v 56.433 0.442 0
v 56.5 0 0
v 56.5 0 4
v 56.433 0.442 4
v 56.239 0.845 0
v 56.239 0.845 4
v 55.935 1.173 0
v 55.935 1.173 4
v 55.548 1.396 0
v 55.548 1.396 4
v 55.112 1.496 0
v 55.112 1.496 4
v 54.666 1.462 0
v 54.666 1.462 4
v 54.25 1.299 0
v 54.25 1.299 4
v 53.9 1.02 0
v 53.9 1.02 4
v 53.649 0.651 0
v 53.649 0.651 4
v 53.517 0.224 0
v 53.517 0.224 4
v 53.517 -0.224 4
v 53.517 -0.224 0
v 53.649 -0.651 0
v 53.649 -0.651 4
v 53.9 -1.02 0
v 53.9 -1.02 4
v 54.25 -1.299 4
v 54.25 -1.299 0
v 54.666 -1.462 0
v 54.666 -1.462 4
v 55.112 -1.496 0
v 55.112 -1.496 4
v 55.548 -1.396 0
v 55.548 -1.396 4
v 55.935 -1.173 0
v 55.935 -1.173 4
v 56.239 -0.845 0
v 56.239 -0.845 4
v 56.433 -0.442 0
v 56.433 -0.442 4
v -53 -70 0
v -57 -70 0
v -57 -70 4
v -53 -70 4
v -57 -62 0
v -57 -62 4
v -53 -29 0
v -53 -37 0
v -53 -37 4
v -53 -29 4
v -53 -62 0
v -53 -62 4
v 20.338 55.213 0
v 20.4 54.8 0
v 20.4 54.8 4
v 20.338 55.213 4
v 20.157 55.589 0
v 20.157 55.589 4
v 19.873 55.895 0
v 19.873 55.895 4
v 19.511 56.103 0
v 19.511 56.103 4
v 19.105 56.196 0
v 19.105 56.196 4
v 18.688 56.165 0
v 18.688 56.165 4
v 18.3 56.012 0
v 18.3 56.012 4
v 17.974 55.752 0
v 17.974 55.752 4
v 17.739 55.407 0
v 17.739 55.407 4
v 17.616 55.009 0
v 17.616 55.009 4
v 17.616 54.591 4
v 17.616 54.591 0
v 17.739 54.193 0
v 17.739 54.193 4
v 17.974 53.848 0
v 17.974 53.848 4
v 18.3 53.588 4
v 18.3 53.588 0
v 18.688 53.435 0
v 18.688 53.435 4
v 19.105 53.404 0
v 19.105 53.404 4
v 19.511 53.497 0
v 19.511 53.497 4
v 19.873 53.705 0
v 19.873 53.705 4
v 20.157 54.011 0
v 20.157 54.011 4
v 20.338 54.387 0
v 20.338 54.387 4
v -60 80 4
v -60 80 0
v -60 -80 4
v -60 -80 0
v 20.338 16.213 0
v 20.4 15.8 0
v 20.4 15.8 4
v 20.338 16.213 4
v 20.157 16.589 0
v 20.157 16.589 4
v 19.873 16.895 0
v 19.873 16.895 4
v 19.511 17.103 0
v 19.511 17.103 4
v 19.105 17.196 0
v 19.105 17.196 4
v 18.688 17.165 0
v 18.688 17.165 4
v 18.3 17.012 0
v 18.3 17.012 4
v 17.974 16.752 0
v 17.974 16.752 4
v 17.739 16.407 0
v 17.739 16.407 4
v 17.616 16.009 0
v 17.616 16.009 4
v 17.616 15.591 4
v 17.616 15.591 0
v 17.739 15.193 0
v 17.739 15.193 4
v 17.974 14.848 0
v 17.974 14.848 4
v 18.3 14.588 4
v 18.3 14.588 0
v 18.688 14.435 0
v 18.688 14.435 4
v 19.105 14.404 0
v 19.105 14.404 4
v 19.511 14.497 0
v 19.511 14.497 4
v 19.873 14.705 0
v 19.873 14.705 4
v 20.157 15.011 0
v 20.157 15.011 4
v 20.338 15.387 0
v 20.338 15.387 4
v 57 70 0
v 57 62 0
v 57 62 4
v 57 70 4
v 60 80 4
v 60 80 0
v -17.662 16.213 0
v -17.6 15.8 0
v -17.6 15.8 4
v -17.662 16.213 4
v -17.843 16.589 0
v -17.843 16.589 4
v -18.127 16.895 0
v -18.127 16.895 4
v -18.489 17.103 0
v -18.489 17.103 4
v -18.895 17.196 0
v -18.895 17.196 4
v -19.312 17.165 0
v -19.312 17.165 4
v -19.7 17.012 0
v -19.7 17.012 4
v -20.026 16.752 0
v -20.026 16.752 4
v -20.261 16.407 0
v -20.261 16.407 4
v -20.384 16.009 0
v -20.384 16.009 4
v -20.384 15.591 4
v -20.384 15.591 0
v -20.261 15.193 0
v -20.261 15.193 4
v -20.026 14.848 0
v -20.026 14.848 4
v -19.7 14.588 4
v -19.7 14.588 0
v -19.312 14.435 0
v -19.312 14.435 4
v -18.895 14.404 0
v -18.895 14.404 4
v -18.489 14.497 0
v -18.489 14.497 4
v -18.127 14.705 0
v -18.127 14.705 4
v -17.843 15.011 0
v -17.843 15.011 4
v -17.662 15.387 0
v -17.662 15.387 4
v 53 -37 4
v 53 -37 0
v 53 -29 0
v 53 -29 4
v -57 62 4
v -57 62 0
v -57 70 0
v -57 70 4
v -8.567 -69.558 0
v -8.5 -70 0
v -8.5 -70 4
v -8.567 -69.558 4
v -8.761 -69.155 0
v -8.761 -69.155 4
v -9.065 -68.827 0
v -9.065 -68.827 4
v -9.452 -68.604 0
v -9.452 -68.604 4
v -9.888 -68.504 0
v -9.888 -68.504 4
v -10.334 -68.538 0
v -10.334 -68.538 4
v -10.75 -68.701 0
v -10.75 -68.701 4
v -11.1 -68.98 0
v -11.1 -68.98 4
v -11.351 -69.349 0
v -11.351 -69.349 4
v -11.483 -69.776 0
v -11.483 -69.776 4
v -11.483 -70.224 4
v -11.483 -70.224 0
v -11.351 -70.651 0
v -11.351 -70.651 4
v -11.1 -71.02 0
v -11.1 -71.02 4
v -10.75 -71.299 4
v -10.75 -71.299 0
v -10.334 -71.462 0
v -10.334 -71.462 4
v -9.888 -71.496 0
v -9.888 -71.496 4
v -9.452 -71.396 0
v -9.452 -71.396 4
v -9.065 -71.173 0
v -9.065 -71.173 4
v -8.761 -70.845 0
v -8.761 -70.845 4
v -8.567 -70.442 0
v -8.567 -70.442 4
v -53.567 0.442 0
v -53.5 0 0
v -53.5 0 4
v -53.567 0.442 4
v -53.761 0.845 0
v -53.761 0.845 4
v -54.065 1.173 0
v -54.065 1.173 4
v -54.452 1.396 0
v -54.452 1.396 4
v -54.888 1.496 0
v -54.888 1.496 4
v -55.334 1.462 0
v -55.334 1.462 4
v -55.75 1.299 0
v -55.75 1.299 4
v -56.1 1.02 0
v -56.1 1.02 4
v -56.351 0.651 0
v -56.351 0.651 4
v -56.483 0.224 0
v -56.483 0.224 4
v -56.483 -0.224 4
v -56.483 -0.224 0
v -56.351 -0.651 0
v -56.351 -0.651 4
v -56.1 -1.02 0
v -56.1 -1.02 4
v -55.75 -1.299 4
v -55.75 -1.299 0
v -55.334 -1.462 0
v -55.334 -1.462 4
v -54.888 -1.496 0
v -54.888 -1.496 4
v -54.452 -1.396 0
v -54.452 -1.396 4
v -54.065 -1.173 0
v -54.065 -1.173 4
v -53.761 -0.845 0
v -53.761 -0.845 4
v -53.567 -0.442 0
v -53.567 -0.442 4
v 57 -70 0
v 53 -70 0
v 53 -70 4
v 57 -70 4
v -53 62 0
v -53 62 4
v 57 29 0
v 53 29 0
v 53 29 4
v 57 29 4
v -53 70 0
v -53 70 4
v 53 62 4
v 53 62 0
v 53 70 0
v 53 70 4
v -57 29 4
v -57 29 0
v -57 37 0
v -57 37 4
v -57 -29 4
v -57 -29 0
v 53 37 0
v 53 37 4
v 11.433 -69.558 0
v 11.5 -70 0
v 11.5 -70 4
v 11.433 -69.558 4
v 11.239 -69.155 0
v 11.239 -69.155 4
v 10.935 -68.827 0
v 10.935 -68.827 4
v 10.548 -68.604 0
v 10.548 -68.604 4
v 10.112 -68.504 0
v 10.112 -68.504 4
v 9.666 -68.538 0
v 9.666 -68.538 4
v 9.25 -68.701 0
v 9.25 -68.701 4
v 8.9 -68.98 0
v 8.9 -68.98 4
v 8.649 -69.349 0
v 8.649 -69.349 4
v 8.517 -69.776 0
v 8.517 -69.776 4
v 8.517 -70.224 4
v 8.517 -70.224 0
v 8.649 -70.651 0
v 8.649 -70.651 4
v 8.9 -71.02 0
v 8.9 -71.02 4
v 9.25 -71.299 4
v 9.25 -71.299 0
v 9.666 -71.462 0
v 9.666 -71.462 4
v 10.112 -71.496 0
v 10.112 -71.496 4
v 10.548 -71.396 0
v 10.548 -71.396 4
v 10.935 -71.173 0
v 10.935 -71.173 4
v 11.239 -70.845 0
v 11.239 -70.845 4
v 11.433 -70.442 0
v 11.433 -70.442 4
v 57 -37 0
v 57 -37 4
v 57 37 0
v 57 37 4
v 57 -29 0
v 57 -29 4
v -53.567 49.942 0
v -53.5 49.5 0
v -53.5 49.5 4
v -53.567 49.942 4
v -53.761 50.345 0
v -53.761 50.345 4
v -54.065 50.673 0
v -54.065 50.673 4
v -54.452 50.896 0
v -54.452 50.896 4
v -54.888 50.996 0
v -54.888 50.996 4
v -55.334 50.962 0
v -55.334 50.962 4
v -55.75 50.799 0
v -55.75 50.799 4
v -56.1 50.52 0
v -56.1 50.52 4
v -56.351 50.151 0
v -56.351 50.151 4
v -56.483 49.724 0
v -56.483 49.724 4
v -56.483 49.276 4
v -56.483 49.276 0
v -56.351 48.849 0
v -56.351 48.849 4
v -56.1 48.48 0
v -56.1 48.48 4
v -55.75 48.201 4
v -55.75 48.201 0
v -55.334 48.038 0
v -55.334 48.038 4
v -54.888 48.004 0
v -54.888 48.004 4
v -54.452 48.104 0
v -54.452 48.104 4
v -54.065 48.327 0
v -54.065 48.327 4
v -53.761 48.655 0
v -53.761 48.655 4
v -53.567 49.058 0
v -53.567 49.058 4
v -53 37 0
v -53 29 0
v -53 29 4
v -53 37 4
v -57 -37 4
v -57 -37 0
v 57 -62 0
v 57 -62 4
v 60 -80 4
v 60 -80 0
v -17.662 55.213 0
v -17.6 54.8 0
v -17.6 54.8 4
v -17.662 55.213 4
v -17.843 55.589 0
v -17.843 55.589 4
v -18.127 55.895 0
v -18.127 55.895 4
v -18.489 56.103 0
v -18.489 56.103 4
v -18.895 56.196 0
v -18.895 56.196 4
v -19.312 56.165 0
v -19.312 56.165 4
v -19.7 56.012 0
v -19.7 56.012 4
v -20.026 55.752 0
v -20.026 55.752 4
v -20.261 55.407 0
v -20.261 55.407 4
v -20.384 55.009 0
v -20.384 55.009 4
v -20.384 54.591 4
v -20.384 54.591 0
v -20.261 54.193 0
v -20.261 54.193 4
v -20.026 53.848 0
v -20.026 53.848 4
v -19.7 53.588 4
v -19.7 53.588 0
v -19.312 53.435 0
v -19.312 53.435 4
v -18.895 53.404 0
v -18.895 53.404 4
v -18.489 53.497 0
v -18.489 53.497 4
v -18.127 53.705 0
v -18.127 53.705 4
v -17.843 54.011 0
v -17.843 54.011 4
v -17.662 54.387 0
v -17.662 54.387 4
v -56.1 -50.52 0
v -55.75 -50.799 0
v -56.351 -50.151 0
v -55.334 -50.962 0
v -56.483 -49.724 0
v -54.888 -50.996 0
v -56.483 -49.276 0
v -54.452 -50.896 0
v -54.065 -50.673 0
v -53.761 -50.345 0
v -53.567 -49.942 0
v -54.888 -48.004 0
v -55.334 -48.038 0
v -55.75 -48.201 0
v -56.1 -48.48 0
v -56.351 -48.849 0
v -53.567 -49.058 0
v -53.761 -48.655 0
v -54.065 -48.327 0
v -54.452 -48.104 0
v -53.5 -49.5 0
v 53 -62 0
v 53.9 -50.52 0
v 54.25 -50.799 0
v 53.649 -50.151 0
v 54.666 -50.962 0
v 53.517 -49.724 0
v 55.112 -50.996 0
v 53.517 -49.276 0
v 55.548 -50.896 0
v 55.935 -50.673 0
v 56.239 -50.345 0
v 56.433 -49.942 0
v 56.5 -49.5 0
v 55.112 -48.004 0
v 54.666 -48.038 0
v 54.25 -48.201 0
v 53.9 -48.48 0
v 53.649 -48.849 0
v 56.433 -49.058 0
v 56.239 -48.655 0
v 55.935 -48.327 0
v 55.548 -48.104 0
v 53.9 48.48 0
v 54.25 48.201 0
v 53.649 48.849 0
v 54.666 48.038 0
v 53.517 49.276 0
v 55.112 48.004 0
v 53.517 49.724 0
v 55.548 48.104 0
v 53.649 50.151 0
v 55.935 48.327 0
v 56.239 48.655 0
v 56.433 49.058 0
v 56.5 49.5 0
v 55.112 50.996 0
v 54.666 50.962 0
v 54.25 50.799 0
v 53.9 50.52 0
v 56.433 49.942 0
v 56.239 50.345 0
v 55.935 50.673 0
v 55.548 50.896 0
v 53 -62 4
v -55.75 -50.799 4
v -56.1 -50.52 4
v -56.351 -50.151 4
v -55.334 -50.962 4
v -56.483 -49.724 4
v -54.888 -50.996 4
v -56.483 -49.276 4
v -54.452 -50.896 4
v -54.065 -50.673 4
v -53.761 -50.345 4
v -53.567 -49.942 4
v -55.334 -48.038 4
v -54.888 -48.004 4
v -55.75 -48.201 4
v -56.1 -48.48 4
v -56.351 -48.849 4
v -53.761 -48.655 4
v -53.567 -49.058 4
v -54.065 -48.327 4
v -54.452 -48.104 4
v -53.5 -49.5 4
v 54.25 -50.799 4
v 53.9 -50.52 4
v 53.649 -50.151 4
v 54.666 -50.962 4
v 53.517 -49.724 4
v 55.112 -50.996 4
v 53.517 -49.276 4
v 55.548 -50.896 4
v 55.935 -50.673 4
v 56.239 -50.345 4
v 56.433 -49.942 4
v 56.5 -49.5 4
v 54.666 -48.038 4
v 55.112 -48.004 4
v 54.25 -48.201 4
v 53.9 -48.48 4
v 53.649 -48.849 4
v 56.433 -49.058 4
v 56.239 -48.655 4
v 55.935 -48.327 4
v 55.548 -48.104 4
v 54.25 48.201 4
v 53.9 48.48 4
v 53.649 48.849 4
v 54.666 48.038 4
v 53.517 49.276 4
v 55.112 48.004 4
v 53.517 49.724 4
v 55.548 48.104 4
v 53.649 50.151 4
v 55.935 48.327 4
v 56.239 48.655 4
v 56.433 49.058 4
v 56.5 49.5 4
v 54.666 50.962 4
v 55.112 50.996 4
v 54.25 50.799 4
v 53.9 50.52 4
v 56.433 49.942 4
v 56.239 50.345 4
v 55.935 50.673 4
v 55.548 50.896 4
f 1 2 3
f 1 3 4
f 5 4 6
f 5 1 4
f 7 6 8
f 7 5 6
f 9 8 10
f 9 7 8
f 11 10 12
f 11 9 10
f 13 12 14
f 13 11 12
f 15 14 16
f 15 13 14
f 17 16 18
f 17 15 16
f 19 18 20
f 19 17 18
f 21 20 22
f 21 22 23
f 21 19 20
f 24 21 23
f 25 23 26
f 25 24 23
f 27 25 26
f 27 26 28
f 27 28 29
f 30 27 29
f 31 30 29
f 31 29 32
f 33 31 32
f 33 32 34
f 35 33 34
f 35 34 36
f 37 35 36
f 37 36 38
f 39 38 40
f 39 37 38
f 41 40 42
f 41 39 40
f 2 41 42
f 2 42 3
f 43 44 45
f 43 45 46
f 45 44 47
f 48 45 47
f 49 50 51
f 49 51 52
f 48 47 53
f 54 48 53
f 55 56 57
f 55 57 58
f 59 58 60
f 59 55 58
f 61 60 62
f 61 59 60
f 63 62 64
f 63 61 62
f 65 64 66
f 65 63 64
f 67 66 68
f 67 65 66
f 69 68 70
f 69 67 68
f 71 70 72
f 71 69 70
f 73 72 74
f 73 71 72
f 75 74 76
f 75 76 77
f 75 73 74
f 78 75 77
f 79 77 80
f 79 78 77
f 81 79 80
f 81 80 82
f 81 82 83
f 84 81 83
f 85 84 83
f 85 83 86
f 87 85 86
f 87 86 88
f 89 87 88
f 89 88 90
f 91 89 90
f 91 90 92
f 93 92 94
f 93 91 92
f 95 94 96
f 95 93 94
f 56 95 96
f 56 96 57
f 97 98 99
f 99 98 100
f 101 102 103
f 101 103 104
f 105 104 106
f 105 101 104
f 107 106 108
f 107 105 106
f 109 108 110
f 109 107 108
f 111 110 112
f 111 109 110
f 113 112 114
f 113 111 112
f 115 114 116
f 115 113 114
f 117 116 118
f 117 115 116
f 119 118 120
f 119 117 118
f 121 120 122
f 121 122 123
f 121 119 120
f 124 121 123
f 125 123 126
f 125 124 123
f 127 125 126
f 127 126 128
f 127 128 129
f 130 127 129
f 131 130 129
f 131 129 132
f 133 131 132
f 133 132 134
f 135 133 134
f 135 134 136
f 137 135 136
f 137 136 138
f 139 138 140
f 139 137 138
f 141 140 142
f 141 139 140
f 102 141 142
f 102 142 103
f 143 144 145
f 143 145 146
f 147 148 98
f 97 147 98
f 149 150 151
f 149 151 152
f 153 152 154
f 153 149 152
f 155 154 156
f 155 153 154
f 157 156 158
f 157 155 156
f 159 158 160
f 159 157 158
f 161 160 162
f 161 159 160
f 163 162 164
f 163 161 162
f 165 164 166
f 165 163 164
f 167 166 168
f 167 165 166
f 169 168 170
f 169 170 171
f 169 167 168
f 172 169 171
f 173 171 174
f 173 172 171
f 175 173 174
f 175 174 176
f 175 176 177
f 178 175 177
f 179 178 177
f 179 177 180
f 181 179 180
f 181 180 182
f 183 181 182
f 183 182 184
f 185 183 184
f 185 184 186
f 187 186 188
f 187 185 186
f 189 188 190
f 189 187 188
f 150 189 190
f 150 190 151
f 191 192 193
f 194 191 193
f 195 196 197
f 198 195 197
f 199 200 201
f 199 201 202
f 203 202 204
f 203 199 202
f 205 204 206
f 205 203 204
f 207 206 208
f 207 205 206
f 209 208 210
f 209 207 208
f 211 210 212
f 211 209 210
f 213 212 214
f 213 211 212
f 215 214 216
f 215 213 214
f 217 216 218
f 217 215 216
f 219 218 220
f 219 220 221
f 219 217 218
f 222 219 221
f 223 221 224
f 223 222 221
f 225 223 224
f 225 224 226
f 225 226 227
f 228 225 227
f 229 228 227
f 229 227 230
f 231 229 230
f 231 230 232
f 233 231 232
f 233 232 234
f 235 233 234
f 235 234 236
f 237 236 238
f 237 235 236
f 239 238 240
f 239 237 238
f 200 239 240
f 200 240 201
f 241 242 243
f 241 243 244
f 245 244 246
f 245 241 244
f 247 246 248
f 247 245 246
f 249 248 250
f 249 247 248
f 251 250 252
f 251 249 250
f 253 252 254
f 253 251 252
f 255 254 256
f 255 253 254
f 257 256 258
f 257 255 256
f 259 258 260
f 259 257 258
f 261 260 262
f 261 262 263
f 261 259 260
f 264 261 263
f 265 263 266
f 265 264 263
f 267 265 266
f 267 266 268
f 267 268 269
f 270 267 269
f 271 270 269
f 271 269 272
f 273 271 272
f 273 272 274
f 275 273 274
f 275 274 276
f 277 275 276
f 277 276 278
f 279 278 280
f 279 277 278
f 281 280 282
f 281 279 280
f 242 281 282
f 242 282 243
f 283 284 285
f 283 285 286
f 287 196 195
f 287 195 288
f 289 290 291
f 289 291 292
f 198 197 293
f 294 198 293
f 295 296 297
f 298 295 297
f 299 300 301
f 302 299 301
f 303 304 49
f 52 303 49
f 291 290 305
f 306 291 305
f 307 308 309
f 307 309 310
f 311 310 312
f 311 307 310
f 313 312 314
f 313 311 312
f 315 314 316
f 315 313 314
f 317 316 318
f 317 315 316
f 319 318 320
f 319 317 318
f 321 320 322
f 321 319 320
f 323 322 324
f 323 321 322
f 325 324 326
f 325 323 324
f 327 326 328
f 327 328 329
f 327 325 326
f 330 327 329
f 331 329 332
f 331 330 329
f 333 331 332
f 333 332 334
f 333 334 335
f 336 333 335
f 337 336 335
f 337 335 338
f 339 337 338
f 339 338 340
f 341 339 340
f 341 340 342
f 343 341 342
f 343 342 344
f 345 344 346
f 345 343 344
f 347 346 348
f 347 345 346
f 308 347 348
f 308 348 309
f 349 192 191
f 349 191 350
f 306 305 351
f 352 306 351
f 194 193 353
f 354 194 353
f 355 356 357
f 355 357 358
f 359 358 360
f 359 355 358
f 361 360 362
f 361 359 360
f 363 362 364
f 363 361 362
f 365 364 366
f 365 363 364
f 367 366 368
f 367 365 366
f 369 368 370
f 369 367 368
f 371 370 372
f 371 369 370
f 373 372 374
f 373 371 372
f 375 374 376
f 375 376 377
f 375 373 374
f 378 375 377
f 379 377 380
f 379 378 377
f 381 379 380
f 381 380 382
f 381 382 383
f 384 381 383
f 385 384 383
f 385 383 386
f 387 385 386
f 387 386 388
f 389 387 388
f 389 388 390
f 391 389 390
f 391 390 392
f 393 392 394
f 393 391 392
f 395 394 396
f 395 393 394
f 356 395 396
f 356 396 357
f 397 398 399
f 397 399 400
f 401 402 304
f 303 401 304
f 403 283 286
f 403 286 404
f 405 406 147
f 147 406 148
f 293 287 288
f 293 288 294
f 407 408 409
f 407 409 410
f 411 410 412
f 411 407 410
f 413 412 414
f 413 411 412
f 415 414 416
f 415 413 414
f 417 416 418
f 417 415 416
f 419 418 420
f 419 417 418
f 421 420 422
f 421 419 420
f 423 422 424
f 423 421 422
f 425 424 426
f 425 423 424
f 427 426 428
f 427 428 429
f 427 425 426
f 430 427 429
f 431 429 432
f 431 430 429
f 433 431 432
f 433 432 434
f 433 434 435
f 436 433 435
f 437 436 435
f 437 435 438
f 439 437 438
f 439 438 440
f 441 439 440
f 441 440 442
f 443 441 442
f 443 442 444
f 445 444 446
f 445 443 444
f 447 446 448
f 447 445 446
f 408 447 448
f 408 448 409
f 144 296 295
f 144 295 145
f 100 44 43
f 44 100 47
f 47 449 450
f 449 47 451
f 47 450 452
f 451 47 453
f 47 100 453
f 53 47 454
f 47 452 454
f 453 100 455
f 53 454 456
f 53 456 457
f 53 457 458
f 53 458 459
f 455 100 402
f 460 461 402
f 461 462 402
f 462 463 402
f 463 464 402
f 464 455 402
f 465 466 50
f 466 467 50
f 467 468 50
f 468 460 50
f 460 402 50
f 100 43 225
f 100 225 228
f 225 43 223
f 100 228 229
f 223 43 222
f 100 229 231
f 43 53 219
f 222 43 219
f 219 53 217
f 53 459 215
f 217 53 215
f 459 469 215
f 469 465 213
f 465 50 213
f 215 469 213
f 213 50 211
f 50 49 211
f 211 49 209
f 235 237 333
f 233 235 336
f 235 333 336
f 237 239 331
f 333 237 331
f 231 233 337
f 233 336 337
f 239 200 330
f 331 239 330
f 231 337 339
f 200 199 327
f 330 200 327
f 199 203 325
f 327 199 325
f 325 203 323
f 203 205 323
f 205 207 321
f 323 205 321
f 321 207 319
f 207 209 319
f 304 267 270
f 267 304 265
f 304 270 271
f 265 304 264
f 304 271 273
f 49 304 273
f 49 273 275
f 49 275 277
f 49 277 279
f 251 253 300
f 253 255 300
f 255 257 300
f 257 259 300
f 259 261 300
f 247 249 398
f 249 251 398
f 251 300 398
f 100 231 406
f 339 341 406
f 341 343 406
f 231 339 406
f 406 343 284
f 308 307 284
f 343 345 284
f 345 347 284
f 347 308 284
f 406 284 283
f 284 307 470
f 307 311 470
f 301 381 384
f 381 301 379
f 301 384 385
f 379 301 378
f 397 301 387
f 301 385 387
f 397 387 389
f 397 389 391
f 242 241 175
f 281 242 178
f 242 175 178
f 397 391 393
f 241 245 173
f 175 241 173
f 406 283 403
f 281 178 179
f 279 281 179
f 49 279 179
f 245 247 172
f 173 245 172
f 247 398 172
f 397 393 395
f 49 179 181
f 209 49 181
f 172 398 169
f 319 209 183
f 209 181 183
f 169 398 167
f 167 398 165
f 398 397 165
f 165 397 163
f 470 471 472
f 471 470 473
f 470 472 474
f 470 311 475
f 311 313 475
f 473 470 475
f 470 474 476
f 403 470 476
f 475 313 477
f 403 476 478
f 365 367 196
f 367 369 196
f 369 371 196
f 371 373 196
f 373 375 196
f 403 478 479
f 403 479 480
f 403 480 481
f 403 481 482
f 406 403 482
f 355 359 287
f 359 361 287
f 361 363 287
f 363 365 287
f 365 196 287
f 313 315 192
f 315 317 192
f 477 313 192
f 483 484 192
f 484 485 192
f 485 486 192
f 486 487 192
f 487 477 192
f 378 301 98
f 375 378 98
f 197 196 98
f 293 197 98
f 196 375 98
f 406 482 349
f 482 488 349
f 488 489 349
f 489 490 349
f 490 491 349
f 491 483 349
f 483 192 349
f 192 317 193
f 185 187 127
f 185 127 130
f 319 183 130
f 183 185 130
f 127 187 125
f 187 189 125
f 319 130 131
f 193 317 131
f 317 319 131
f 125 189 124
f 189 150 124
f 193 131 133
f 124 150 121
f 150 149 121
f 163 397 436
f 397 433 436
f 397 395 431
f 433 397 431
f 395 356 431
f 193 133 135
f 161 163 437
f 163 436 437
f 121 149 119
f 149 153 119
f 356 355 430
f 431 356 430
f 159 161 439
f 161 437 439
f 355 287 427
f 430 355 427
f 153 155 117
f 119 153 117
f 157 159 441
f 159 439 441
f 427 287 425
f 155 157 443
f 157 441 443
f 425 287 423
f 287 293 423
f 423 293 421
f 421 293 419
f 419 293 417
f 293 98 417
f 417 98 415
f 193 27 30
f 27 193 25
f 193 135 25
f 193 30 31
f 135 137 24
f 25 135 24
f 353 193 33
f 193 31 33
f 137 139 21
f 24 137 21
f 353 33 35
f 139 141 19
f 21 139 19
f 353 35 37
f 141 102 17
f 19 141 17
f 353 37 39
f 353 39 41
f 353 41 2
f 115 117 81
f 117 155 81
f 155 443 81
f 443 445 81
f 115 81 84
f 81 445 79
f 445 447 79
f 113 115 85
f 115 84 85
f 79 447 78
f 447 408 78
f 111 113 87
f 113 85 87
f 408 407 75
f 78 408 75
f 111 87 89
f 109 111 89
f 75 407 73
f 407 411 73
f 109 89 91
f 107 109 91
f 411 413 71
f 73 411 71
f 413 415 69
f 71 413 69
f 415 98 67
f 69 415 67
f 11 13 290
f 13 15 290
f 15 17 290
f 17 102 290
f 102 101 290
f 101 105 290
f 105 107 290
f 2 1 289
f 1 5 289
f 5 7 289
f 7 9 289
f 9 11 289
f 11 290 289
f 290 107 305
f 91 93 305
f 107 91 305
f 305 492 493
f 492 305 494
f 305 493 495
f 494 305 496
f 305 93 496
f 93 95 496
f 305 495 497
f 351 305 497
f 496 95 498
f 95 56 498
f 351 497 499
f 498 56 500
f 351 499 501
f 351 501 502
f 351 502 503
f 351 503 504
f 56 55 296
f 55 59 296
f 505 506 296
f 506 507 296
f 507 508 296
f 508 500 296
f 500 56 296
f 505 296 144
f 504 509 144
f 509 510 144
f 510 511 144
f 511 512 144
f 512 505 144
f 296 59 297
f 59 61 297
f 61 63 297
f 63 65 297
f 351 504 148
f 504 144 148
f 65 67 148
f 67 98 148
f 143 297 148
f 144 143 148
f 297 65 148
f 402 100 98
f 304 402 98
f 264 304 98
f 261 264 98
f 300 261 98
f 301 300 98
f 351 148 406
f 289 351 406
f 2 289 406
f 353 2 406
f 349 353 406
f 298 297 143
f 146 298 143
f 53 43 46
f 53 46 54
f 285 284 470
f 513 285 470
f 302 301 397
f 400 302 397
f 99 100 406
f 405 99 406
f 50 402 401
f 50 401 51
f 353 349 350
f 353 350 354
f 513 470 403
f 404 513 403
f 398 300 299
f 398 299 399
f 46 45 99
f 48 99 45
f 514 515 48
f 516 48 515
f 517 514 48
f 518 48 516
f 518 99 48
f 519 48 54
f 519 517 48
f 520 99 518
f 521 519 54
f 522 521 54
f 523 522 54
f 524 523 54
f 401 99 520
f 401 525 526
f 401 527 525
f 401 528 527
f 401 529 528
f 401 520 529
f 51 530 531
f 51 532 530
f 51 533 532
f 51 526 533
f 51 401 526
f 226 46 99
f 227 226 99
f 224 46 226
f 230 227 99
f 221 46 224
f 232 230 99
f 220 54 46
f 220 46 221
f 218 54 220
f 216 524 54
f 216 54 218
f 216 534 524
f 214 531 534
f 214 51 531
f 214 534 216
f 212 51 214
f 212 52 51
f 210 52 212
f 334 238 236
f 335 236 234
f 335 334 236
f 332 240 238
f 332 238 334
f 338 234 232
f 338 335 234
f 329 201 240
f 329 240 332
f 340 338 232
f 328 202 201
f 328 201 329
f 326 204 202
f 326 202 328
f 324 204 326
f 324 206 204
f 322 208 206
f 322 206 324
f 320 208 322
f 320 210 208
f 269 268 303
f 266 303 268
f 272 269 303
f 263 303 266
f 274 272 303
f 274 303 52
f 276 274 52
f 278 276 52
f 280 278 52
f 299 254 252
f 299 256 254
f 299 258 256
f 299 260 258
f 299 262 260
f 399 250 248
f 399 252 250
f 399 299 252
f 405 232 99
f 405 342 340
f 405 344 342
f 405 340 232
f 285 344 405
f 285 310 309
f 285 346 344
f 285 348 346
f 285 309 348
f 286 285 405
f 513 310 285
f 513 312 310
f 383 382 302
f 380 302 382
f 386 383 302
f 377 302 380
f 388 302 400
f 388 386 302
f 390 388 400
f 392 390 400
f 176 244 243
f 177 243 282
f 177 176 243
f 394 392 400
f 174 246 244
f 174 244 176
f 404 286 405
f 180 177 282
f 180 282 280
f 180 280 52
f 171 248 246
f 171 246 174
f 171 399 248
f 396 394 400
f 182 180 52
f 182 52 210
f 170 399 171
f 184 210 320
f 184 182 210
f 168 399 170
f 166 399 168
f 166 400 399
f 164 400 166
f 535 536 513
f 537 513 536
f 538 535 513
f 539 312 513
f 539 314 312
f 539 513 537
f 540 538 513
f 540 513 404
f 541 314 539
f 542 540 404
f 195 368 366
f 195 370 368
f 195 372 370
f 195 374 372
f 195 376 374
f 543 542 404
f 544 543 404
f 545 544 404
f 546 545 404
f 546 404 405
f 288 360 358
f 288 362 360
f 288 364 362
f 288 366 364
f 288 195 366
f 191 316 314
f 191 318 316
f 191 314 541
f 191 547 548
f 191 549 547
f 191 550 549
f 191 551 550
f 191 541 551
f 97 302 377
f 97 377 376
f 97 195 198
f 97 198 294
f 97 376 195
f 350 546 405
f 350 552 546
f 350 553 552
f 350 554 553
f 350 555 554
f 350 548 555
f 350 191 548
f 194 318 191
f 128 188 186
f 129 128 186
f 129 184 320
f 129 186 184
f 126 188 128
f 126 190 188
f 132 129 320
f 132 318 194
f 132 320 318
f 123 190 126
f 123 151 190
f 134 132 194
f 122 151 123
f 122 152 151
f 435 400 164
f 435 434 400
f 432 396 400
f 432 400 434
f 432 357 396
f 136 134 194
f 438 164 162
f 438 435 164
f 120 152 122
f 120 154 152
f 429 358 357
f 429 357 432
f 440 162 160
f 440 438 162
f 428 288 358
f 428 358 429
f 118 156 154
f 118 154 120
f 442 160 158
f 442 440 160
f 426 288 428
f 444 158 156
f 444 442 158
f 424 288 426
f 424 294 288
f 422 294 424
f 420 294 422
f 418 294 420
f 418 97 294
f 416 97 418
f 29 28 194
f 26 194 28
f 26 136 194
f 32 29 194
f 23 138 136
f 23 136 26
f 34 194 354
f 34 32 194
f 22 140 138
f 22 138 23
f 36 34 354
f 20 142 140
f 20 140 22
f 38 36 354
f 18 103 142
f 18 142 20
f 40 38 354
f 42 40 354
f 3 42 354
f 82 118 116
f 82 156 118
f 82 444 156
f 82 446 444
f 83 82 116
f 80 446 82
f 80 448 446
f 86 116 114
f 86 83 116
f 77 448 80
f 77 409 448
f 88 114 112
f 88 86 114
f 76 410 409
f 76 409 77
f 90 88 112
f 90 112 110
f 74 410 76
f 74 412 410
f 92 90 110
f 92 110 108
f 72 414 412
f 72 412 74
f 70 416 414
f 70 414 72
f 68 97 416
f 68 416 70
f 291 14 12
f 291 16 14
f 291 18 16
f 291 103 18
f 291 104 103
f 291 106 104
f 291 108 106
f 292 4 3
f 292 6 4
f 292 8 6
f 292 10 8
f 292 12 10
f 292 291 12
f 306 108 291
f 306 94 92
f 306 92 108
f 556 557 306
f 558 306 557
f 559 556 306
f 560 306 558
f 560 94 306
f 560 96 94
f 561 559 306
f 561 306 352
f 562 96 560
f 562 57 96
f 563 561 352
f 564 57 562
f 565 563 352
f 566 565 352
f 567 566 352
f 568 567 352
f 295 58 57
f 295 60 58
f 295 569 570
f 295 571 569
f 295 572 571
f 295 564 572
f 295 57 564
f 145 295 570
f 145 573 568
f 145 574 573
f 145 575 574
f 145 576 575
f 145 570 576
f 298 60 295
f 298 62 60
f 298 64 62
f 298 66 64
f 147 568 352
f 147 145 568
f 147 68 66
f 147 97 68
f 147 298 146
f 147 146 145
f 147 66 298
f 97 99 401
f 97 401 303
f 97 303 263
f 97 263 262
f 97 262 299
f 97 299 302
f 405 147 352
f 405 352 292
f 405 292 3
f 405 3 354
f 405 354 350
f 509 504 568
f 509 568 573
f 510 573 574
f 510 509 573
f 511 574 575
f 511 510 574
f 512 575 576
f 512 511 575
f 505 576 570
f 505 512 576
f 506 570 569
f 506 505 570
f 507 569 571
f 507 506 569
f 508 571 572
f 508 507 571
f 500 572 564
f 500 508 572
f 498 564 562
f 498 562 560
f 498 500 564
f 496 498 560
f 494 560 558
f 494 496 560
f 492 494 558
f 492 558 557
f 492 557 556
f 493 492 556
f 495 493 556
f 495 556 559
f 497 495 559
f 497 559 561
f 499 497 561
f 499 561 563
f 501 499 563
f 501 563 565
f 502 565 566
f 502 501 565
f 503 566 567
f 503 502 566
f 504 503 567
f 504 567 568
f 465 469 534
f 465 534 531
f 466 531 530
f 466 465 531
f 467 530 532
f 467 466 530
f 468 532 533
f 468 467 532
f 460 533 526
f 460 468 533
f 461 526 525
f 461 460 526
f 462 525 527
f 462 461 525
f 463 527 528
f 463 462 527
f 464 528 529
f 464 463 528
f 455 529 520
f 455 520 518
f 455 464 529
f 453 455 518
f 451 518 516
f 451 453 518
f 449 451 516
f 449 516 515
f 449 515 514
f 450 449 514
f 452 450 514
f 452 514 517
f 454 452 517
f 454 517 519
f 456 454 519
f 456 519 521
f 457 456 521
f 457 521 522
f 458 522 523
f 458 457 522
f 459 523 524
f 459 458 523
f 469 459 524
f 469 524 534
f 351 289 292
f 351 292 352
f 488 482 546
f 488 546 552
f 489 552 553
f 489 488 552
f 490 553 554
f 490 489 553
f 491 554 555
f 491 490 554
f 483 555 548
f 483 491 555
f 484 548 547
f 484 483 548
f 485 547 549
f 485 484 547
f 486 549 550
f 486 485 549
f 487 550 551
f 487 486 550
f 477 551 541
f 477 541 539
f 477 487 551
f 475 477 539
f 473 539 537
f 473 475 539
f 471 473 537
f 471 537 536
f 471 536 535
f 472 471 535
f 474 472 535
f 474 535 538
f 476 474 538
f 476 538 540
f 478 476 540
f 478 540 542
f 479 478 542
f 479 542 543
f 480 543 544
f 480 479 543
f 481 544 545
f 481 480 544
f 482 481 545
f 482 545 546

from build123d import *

# Parameters (mm, degrees)
SKETCH1_W           = 4
SKETCH1_H           = 8
SKETCH1_R           = 1.5
SKETCH1_R_2         = 1.4
BOSS_EXTRUDE2_DEPTH = 4


with BuildPart() as part:
    # Sketch1 → Boss-Extrude2 (new body)
    with BuildSketch(Plane.XY):
        Polygon((-10, 80), (-60, 80), (-60, -80), (60, -80), (60, 80), (10, 80), align=None)
        with Locations((-55, -66)):
            Rectangle(SKETCH1_W, SKETCH1_H, mode=Mode.SUBTRACT)
        with Locations((-55, -49.5)):
            Circle(SKETCH1_R, mode=Mode.SUBTRACT)
        with Locations((-10, -70)):
            Circle(SKETCH1_R, mode=Mode.SUBTRACT)
        with Locations((-55, -33)):
            Rectangle(SKETCH1_W, SKETCH1_H, mode=Mode.SUBTRACT)
        with Locations((10, -70)):
            Circle(SKETCH1_R, mode=Mode.SUBTRACT)
        with Locations((55, -66)):
            Rectangle(SKETCH1_W, SKETCH1_H, mode=Mode.SUBTRACT)
        with Locations((55, -49.5)):
            Circle(SKETCH1_R, mode=Mode.SUBTRACT)
        with Locations((55, -33)):
            Rectangle(SKETCH1_W, SKETCH1_H, mode=Mode.SUBTRACT)
        with Locations((-55, 0)):
            Circle(SKETCH1_R, mode=Mode.SUBTRACT)
        with Locations((-55, 33)):
            Rectangle(SKETCH1_W, SKETCH1_H, mode=Mode.SUBTRACT)
        with Locations((-19, 15.8)):
            Circle(SKETCH1_R_2, mode=Mode.SUBTRACT)
        with Locations((-55, 49.5)):
            Circle(SKETCH1_R, mode=Mode.SUBTRACT)
        with Locations((-55, 66)):
            Rectangle(SKETCH1_W, SKETCH1_H, mode=Mode.SUBTRACT)
        with Locations((-19, 54.8)):
            Circle(SKETCH1_R_2, mode=Mode.SUBTRACT)
        with Locations((19, 15.8)):
            Circle(SKETCH1_R_2, mode=Mode.SUBTRACT)
        with Locations((55, 0)):
            Circle(SKETCH1_R, mode=Mode.SUBTRACT)
        with Locations((55, 33)):
            Rectangle(SKETCH1_W, SKETCH1_H, mode=Mode.SUBTRACT)
        with Locations((19, 54.8)):
            Circle(SKETCH1_R_2, mode=Mode.SUBTRACT)
        with Locations((55, 49.5)):
            Circle(SKETCH1_R, mode=Mode.SUBTRACT)
        with Locations((55, 66)):
            Rectangle(SKETCH1_W, SKETCH1_H, mode=Mode.SUBTRACT)
    extrude(amount=BOSS_EXTRUDE2_DEPTH)


solid = part.part
